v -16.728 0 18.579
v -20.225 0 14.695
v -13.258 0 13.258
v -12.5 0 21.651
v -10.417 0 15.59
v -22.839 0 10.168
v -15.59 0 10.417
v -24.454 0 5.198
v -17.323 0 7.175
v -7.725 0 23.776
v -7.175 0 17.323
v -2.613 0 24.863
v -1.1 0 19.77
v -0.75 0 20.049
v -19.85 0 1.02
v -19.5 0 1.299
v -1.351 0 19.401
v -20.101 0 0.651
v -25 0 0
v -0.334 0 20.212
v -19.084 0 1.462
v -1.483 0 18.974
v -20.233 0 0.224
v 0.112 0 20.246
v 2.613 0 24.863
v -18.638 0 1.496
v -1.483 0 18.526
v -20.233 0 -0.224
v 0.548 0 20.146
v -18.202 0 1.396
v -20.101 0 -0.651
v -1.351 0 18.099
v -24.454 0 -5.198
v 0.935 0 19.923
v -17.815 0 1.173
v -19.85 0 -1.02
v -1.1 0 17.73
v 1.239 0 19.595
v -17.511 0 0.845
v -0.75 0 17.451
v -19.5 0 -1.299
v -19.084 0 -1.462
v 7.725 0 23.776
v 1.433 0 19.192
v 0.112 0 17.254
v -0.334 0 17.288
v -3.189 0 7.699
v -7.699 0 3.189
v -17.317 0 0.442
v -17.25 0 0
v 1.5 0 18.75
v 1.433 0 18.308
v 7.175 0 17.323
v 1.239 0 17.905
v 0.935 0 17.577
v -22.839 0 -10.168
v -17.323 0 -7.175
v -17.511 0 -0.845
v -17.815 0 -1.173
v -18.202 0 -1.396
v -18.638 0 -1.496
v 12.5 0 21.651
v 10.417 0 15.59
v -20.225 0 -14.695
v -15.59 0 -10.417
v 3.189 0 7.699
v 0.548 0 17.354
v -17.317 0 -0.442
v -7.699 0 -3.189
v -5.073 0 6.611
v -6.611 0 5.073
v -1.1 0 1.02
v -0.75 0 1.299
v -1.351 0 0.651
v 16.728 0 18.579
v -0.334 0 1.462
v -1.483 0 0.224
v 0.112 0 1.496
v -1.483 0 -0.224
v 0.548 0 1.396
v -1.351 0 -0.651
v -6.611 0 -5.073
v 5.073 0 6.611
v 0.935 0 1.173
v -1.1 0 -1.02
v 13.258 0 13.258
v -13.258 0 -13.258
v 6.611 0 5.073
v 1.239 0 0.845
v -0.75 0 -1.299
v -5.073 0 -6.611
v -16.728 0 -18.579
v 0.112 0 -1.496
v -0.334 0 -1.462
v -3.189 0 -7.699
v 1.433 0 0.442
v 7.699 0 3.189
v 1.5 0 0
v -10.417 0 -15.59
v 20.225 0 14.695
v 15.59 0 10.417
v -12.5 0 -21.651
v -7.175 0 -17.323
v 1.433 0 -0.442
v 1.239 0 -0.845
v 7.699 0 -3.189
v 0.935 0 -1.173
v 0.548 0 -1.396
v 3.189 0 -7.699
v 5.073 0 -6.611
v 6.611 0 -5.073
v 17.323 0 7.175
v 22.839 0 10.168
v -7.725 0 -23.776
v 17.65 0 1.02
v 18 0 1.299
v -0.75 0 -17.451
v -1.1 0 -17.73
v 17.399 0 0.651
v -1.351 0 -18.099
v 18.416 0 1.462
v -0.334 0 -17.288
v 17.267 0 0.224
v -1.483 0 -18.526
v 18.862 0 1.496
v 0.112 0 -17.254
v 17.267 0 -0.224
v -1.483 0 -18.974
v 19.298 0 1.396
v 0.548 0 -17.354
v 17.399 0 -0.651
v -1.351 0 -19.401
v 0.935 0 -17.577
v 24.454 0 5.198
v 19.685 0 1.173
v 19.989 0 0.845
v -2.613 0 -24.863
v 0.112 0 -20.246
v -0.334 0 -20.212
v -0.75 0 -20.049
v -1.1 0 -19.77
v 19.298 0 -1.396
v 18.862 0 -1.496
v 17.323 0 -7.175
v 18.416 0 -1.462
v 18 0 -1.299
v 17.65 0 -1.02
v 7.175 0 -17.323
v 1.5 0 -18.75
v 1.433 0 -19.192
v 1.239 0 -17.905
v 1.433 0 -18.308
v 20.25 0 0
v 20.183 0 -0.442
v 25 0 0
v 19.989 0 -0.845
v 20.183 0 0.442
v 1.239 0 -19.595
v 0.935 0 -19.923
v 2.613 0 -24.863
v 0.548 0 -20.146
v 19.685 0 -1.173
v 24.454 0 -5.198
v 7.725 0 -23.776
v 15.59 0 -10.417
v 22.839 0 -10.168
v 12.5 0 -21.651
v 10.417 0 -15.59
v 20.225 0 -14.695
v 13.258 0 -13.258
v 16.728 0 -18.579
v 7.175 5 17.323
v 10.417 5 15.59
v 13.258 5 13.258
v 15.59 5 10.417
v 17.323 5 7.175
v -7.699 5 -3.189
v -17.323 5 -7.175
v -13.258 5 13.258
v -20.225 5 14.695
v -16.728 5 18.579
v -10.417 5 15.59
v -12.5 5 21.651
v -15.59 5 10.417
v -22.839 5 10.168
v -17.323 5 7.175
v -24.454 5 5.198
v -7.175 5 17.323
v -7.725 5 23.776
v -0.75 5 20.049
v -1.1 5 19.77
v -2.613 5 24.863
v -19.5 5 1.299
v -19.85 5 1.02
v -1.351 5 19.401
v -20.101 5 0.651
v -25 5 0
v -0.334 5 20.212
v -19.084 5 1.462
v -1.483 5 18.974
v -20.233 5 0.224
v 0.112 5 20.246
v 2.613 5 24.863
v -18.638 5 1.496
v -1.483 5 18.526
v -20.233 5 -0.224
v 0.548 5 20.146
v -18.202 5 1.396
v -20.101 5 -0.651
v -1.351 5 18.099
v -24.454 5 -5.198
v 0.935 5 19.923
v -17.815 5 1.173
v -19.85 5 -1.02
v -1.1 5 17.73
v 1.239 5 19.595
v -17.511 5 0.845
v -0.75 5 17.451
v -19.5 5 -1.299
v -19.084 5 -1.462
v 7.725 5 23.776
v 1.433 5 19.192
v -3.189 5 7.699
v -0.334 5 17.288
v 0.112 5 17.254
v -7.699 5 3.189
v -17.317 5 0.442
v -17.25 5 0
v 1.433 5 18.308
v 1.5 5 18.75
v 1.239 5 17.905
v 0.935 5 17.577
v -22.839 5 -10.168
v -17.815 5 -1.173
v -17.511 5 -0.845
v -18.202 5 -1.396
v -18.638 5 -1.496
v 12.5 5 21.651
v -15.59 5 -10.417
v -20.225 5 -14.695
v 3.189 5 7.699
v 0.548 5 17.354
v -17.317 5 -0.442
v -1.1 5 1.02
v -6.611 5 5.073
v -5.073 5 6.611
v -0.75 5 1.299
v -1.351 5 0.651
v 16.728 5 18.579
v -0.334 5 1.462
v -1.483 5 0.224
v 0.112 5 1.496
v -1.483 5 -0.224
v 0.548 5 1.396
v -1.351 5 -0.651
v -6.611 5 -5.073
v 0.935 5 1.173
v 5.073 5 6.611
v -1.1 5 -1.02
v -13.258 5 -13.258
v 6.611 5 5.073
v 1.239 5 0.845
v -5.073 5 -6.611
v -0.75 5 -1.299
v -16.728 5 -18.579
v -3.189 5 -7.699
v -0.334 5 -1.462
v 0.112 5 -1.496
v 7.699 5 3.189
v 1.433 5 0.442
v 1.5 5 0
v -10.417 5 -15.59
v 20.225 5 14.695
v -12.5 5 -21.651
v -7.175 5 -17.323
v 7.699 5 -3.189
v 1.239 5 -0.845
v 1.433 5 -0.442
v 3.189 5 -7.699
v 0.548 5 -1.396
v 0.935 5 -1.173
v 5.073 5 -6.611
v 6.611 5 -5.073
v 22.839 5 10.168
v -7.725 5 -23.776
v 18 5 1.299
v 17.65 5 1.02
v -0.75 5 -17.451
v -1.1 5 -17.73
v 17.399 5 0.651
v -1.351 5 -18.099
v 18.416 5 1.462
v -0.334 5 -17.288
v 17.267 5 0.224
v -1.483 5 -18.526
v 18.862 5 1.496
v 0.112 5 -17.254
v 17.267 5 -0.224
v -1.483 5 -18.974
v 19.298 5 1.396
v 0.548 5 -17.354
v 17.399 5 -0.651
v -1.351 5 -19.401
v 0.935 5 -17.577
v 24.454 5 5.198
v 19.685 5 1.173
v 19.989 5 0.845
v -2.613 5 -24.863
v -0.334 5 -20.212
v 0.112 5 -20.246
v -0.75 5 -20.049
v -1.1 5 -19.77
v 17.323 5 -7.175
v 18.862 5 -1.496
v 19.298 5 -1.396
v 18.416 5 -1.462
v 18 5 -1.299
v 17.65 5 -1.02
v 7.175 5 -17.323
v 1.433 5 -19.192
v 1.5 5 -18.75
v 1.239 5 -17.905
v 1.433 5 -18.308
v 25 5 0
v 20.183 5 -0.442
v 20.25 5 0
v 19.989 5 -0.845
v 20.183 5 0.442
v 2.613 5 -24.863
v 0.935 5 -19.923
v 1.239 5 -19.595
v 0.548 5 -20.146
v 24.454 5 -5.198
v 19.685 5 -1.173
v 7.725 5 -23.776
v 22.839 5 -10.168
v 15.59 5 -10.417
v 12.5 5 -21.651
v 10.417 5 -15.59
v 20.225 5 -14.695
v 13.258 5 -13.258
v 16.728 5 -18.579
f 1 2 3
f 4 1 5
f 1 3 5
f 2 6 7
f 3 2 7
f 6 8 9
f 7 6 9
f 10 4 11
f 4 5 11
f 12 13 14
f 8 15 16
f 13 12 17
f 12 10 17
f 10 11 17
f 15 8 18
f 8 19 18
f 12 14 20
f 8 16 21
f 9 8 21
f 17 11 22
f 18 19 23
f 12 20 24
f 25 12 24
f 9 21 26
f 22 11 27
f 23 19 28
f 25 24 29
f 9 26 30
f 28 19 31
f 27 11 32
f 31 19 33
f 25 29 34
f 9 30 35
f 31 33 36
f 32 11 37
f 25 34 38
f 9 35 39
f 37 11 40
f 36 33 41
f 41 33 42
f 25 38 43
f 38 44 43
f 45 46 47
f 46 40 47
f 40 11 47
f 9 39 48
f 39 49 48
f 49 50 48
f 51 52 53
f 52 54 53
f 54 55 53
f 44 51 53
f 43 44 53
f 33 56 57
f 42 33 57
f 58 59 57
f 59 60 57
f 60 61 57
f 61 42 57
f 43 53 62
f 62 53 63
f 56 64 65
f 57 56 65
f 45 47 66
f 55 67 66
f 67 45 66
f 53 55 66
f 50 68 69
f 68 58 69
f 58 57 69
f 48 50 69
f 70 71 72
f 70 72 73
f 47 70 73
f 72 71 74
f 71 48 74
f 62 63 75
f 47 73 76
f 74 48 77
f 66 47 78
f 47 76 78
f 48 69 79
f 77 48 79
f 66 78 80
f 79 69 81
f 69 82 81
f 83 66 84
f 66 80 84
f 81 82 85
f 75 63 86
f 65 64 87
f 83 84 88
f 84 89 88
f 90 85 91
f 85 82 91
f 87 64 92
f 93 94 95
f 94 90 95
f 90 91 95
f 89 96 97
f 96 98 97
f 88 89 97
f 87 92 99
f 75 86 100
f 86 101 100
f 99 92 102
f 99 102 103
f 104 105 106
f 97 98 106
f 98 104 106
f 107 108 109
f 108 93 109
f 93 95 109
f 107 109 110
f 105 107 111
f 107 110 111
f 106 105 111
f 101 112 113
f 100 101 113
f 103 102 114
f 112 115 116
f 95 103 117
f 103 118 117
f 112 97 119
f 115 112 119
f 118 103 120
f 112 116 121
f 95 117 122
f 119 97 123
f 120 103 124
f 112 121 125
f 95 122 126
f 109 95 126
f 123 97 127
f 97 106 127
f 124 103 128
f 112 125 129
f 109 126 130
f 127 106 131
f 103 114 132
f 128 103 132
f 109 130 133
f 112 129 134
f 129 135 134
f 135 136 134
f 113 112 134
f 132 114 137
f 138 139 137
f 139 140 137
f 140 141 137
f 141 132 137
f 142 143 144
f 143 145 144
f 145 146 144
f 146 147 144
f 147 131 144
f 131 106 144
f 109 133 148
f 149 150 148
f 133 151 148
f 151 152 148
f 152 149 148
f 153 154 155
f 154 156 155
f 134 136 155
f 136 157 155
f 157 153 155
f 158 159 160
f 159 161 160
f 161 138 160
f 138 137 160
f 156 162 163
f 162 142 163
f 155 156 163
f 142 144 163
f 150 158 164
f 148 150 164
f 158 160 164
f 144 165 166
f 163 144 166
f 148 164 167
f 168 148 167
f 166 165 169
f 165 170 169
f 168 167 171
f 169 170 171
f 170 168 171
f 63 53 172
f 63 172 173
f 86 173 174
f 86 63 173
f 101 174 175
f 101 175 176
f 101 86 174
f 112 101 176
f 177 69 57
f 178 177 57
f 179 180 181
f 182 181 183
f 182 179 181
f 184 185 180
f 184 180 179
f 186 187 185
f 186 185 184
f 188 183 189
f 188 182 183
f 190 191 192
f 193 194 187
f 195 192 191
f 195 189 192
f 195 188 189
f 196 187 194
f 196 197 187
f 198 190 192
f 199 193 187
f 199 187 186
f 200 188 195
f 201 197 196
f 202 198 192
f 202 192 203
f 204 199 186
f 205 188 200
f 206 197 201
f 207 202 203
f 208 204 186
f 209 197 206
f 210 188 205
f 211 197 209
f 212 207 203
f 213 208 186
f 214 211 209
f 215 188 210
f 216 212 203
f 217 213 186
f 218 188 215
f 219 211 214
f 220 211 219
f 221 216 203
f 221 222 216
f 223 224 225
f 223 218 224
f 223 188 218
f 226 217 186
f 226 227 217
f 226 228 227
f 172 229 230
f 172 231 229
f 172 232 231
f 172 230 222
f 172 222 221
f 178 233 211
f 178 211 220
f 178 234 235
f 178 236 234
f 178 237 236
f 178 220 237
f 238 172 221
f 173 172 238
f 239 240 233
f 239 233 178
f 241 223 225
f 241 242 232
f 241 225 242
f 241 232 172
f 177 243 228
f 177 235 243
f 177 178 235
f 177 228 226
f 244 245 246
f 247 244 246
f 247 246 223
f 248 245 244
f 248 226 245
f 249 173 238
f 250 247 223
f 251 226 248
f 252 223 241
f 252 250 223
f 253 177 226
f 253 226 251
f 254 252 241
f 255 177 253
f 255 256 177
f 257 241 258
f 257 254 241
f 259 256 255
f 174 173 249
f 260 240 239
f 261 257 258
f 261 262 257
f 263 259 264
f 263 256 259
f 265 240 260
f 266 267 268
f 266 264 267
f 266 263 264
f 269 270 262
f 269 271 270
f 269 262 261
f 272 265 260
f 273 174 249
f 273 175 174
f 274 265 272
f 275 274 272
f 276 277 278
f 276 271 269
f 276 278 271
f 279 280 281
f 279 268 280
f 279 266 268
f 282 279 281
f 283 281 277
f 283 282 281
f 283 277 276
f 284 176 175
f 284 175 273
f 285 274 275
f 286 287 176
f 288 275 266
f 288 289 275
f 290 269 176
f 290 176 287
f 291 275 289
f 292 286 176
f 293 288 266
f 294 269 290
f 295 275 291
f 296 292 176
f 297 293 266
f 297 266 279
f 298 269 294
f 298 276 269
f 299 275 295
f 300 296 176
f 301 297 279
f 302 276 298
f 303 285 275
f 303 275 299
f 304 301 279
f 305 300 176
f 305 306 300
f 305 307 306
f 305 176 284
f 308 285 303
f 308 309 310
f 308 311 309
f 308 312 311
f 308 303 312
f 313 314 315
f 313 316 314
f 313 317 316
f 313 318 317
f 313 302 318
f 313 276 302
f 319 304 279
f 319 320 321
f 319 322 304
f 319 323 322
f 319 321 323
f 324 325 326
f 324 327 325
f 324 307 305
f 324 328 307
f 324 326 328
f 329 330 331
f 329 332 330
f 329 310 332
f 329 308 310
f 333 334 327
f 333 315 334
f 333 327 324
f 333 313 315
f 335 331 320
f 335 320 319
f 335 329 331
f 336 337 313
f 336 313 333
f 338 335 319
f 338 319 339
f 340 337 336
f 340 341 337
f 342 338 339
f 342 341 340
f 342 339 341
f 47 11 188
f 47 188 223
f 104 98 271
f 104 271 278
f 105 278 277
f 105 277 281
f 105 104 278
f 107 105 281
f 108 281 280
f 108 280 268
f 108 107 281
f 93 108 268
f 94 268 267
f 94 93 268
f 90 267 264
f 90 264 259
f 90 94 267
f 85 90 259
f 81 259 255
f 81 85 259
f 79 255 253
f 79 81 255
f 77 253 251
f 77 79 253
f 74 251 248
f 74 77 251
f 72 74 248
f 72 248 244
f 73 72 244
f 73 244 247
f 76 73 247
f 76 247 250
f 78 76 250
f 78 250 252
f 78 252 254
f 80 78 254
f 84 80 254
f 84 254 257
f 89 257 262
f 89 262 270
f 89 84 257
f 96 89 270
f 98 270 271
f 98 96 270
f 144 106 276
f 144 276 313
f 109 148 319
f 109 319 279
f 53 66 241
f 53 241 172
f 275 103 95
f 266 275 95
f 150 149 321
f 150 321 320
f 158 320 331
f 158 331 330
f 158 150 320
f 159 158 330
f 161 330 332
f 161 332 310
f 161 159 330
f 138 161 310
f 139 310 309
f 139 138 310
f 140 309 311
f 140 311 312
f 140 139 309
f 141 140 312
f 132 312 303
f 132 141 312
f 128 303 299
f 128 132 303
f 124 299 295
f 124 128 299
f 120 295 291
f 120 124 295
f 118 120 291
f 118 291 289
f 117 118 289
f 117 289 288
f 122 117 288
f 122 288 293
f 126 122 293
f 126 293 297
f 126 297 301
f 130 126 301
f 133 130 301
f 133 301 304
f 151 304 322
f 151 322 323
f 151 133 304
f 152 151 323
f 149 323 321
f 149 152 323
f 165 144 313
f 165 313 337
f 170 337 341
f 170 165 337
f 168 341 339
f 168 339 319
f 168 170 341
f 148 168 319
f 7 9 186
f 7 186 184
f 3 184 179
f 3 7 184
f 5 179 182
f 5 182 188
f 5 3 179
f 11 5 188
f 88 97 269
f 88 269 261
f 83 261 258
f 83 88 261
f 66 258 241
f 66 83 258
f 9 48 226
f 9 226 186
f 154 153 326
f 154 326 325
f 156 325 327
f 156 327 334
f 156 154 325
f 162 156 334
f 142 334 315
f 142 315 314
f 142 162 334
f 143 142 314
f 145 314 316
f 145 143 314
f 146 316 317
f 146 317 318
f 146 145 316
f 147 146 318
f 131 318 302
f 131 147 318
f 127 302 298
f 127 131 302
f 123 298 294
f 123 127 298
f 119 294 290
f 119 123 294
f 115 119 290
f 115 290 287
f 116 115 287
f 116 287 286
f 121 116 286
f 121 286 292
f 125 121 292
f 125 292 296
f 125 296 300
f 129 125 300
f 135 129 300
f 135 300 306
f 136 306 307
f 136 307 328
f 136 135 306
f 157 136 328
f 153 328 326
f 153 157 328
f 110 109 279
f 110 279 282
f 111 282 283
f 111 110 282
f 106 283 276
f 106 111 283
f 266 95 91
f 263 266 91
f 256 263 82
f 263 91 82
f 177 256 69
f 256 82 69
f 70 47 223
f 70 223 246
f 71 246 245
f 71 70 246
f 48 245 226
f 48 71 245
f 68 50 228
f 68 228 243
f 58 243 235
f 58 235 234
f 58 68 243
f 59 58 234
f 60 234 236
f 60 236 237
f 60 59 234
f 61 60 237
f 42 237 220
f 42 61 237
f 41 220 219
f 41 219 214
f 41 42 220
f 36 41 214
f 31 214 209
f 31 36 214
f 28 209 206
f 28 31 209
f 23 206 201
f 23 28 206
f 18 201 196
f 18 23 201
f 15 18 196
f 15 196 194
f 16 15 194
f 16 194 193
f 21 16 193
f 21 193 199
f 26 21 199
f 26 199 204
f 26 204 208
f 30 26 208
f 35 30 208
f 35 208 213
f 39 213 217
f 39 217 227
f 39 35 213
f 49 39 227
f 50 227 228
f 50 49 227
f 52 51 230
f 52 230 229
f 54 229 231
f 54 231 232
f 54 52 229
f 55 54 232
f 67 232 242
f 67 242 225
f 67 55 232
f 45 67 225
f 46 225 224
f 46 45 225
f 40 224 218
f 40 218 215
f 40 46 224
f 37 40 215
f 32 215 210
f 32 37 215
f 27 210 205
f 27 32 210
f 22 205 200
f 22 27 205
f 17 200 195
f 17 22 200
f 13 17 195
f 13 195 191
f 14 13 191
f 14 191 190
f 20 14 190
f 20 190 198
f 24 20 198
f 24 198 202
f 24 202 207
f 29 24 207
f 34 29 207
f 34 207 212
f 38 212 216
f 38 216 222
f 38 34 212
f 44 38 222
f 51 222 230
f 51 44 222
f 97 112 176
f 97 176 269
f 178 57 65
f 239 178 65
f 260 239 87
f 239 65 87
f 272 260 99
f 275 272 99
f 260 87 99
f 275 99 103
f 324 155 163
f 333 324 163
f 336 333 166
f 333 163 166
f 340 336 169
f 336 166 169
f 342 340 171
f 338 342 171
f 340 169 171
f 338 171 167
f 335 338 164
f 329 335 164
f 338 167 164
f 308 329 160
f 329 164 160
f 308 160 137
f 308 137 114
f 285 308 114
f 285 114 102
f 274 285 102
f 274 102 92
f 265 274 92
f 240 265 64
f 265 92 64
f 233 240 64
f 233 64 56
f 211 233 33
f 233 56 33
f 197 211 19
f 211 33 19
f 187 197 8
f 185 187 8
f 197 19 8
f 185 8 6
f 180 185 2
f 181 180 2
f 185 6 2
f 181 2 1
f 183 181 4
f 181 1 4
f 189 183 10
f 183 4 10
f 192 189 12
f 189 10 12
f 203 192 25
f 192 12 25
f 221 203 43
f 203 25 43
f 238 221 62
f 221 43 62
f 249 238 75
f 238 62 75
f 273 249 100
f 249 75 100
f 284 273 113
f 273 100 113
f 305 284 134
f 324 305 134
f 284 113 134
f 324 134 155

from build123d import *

# Parameters (mm, degrees)
SKETCH1_R           = 25
SKETCH1_R_2         = 1.5
BOSS_EXTRUDE1_DEPTH = 5


with BuildPart() as part:
    # Sketch1 → Boss-Extrude1 (new body)
    with BuildSketch(Plane(origin=(0, 0, 0), x_dir=(1, 0, 0), z_dir=(0, 1, 0))):
        Circle(SKETCH1_R)
        Circle(SKETCH1_R_2, mode=Mode.SUBTRACT)
        with Locations((18.75, 0)):
            Circle(SKETCH1_R_2, mode=Mode.SUBTRACT)
        with Locations((0, -18.75)):
            Circle(SKETCH1_R_2, mode=Mode.SUBTRACT)
        with Locations((-18.75, 0)):
            Circle(SKETCH1_R_2, mode=Mode.SUBTRACT)
        with Locations((0, 18.75)):
            Circle(SKETCH1_R_2, mode=Mode.SUBTRACT)
        with BuildLine():
            Line((7.698996104, 3.189028603), (17.322741235, 7.175314357))
            ThreePointArc((17.322741235, 7.175314357), (13.258252147, 13.258252147), (7.175314357, 17.322741235))
            Line((7.175314357, 17.322741235), (3.189028603, 7.698996104))
            ThreePointArc((3.189028603, 7.698996104), (5.89255651, 5.89255651), (7.698996104, 3.189028603))
        make_face(mode=Mode.SUBTRACT)
        with BuildLine():
            Line((3.189028603, -7.698996104), (7.175314357, -17.322741235))
            ThreePointArc((7.175314357, -17.322741235), (13.258252147, -13.258252147), (17.322741235, -7.175314357))
            Line((17.322741235, -7.175314357), (7.698996104, -3.189028603))
            ThreePointArc((7.698996104, -3.189028603), (5.89255651, -5.89255651), (3.189028603, -7.698996104))
        make_face(mode=Mode.SUBTRACT)
        with BuildLine():
            Line((-7.698996104, -3.189028603), (-17.322741235, -7.175314357))
            ThreePointArc((-17.322741235, -7.175314357), (-13.258252147, -13.258252147), (-7.175314357, -17.322741235))
            Line((-7.175314357, -17.322741235), (-3.189028603, -7.698996104))
            ThreePointArc((-3.189028603, -7.698996104), (-5.89255651, -5.89255651), (-7.698996104, -3.189028603))
        make_face(mode=Mode.SUBTRACT)
        with BuildLine():
            Line((-7.698996104, 3.189028603), (-17.322741235, 7.175314357))
            ThreePointArc((-17.322741235, 7.175314357), (-13.258252147, 13.258252147), (-7.175314357, 17.322741235))
            Line((-7.175314357, 17.322741235), (-3.189028603, 7.698996104))
            ThreePointArc((-3.189028603, 7.698996104), (-5.89255651, 5.89255651), (-7.698996104, 3.189028603))
        make_face(mode=Mode.SUBTRACT)
    extrude(amount=BOSS_EXTRUDE1_DEPTH)


solid = part.part
